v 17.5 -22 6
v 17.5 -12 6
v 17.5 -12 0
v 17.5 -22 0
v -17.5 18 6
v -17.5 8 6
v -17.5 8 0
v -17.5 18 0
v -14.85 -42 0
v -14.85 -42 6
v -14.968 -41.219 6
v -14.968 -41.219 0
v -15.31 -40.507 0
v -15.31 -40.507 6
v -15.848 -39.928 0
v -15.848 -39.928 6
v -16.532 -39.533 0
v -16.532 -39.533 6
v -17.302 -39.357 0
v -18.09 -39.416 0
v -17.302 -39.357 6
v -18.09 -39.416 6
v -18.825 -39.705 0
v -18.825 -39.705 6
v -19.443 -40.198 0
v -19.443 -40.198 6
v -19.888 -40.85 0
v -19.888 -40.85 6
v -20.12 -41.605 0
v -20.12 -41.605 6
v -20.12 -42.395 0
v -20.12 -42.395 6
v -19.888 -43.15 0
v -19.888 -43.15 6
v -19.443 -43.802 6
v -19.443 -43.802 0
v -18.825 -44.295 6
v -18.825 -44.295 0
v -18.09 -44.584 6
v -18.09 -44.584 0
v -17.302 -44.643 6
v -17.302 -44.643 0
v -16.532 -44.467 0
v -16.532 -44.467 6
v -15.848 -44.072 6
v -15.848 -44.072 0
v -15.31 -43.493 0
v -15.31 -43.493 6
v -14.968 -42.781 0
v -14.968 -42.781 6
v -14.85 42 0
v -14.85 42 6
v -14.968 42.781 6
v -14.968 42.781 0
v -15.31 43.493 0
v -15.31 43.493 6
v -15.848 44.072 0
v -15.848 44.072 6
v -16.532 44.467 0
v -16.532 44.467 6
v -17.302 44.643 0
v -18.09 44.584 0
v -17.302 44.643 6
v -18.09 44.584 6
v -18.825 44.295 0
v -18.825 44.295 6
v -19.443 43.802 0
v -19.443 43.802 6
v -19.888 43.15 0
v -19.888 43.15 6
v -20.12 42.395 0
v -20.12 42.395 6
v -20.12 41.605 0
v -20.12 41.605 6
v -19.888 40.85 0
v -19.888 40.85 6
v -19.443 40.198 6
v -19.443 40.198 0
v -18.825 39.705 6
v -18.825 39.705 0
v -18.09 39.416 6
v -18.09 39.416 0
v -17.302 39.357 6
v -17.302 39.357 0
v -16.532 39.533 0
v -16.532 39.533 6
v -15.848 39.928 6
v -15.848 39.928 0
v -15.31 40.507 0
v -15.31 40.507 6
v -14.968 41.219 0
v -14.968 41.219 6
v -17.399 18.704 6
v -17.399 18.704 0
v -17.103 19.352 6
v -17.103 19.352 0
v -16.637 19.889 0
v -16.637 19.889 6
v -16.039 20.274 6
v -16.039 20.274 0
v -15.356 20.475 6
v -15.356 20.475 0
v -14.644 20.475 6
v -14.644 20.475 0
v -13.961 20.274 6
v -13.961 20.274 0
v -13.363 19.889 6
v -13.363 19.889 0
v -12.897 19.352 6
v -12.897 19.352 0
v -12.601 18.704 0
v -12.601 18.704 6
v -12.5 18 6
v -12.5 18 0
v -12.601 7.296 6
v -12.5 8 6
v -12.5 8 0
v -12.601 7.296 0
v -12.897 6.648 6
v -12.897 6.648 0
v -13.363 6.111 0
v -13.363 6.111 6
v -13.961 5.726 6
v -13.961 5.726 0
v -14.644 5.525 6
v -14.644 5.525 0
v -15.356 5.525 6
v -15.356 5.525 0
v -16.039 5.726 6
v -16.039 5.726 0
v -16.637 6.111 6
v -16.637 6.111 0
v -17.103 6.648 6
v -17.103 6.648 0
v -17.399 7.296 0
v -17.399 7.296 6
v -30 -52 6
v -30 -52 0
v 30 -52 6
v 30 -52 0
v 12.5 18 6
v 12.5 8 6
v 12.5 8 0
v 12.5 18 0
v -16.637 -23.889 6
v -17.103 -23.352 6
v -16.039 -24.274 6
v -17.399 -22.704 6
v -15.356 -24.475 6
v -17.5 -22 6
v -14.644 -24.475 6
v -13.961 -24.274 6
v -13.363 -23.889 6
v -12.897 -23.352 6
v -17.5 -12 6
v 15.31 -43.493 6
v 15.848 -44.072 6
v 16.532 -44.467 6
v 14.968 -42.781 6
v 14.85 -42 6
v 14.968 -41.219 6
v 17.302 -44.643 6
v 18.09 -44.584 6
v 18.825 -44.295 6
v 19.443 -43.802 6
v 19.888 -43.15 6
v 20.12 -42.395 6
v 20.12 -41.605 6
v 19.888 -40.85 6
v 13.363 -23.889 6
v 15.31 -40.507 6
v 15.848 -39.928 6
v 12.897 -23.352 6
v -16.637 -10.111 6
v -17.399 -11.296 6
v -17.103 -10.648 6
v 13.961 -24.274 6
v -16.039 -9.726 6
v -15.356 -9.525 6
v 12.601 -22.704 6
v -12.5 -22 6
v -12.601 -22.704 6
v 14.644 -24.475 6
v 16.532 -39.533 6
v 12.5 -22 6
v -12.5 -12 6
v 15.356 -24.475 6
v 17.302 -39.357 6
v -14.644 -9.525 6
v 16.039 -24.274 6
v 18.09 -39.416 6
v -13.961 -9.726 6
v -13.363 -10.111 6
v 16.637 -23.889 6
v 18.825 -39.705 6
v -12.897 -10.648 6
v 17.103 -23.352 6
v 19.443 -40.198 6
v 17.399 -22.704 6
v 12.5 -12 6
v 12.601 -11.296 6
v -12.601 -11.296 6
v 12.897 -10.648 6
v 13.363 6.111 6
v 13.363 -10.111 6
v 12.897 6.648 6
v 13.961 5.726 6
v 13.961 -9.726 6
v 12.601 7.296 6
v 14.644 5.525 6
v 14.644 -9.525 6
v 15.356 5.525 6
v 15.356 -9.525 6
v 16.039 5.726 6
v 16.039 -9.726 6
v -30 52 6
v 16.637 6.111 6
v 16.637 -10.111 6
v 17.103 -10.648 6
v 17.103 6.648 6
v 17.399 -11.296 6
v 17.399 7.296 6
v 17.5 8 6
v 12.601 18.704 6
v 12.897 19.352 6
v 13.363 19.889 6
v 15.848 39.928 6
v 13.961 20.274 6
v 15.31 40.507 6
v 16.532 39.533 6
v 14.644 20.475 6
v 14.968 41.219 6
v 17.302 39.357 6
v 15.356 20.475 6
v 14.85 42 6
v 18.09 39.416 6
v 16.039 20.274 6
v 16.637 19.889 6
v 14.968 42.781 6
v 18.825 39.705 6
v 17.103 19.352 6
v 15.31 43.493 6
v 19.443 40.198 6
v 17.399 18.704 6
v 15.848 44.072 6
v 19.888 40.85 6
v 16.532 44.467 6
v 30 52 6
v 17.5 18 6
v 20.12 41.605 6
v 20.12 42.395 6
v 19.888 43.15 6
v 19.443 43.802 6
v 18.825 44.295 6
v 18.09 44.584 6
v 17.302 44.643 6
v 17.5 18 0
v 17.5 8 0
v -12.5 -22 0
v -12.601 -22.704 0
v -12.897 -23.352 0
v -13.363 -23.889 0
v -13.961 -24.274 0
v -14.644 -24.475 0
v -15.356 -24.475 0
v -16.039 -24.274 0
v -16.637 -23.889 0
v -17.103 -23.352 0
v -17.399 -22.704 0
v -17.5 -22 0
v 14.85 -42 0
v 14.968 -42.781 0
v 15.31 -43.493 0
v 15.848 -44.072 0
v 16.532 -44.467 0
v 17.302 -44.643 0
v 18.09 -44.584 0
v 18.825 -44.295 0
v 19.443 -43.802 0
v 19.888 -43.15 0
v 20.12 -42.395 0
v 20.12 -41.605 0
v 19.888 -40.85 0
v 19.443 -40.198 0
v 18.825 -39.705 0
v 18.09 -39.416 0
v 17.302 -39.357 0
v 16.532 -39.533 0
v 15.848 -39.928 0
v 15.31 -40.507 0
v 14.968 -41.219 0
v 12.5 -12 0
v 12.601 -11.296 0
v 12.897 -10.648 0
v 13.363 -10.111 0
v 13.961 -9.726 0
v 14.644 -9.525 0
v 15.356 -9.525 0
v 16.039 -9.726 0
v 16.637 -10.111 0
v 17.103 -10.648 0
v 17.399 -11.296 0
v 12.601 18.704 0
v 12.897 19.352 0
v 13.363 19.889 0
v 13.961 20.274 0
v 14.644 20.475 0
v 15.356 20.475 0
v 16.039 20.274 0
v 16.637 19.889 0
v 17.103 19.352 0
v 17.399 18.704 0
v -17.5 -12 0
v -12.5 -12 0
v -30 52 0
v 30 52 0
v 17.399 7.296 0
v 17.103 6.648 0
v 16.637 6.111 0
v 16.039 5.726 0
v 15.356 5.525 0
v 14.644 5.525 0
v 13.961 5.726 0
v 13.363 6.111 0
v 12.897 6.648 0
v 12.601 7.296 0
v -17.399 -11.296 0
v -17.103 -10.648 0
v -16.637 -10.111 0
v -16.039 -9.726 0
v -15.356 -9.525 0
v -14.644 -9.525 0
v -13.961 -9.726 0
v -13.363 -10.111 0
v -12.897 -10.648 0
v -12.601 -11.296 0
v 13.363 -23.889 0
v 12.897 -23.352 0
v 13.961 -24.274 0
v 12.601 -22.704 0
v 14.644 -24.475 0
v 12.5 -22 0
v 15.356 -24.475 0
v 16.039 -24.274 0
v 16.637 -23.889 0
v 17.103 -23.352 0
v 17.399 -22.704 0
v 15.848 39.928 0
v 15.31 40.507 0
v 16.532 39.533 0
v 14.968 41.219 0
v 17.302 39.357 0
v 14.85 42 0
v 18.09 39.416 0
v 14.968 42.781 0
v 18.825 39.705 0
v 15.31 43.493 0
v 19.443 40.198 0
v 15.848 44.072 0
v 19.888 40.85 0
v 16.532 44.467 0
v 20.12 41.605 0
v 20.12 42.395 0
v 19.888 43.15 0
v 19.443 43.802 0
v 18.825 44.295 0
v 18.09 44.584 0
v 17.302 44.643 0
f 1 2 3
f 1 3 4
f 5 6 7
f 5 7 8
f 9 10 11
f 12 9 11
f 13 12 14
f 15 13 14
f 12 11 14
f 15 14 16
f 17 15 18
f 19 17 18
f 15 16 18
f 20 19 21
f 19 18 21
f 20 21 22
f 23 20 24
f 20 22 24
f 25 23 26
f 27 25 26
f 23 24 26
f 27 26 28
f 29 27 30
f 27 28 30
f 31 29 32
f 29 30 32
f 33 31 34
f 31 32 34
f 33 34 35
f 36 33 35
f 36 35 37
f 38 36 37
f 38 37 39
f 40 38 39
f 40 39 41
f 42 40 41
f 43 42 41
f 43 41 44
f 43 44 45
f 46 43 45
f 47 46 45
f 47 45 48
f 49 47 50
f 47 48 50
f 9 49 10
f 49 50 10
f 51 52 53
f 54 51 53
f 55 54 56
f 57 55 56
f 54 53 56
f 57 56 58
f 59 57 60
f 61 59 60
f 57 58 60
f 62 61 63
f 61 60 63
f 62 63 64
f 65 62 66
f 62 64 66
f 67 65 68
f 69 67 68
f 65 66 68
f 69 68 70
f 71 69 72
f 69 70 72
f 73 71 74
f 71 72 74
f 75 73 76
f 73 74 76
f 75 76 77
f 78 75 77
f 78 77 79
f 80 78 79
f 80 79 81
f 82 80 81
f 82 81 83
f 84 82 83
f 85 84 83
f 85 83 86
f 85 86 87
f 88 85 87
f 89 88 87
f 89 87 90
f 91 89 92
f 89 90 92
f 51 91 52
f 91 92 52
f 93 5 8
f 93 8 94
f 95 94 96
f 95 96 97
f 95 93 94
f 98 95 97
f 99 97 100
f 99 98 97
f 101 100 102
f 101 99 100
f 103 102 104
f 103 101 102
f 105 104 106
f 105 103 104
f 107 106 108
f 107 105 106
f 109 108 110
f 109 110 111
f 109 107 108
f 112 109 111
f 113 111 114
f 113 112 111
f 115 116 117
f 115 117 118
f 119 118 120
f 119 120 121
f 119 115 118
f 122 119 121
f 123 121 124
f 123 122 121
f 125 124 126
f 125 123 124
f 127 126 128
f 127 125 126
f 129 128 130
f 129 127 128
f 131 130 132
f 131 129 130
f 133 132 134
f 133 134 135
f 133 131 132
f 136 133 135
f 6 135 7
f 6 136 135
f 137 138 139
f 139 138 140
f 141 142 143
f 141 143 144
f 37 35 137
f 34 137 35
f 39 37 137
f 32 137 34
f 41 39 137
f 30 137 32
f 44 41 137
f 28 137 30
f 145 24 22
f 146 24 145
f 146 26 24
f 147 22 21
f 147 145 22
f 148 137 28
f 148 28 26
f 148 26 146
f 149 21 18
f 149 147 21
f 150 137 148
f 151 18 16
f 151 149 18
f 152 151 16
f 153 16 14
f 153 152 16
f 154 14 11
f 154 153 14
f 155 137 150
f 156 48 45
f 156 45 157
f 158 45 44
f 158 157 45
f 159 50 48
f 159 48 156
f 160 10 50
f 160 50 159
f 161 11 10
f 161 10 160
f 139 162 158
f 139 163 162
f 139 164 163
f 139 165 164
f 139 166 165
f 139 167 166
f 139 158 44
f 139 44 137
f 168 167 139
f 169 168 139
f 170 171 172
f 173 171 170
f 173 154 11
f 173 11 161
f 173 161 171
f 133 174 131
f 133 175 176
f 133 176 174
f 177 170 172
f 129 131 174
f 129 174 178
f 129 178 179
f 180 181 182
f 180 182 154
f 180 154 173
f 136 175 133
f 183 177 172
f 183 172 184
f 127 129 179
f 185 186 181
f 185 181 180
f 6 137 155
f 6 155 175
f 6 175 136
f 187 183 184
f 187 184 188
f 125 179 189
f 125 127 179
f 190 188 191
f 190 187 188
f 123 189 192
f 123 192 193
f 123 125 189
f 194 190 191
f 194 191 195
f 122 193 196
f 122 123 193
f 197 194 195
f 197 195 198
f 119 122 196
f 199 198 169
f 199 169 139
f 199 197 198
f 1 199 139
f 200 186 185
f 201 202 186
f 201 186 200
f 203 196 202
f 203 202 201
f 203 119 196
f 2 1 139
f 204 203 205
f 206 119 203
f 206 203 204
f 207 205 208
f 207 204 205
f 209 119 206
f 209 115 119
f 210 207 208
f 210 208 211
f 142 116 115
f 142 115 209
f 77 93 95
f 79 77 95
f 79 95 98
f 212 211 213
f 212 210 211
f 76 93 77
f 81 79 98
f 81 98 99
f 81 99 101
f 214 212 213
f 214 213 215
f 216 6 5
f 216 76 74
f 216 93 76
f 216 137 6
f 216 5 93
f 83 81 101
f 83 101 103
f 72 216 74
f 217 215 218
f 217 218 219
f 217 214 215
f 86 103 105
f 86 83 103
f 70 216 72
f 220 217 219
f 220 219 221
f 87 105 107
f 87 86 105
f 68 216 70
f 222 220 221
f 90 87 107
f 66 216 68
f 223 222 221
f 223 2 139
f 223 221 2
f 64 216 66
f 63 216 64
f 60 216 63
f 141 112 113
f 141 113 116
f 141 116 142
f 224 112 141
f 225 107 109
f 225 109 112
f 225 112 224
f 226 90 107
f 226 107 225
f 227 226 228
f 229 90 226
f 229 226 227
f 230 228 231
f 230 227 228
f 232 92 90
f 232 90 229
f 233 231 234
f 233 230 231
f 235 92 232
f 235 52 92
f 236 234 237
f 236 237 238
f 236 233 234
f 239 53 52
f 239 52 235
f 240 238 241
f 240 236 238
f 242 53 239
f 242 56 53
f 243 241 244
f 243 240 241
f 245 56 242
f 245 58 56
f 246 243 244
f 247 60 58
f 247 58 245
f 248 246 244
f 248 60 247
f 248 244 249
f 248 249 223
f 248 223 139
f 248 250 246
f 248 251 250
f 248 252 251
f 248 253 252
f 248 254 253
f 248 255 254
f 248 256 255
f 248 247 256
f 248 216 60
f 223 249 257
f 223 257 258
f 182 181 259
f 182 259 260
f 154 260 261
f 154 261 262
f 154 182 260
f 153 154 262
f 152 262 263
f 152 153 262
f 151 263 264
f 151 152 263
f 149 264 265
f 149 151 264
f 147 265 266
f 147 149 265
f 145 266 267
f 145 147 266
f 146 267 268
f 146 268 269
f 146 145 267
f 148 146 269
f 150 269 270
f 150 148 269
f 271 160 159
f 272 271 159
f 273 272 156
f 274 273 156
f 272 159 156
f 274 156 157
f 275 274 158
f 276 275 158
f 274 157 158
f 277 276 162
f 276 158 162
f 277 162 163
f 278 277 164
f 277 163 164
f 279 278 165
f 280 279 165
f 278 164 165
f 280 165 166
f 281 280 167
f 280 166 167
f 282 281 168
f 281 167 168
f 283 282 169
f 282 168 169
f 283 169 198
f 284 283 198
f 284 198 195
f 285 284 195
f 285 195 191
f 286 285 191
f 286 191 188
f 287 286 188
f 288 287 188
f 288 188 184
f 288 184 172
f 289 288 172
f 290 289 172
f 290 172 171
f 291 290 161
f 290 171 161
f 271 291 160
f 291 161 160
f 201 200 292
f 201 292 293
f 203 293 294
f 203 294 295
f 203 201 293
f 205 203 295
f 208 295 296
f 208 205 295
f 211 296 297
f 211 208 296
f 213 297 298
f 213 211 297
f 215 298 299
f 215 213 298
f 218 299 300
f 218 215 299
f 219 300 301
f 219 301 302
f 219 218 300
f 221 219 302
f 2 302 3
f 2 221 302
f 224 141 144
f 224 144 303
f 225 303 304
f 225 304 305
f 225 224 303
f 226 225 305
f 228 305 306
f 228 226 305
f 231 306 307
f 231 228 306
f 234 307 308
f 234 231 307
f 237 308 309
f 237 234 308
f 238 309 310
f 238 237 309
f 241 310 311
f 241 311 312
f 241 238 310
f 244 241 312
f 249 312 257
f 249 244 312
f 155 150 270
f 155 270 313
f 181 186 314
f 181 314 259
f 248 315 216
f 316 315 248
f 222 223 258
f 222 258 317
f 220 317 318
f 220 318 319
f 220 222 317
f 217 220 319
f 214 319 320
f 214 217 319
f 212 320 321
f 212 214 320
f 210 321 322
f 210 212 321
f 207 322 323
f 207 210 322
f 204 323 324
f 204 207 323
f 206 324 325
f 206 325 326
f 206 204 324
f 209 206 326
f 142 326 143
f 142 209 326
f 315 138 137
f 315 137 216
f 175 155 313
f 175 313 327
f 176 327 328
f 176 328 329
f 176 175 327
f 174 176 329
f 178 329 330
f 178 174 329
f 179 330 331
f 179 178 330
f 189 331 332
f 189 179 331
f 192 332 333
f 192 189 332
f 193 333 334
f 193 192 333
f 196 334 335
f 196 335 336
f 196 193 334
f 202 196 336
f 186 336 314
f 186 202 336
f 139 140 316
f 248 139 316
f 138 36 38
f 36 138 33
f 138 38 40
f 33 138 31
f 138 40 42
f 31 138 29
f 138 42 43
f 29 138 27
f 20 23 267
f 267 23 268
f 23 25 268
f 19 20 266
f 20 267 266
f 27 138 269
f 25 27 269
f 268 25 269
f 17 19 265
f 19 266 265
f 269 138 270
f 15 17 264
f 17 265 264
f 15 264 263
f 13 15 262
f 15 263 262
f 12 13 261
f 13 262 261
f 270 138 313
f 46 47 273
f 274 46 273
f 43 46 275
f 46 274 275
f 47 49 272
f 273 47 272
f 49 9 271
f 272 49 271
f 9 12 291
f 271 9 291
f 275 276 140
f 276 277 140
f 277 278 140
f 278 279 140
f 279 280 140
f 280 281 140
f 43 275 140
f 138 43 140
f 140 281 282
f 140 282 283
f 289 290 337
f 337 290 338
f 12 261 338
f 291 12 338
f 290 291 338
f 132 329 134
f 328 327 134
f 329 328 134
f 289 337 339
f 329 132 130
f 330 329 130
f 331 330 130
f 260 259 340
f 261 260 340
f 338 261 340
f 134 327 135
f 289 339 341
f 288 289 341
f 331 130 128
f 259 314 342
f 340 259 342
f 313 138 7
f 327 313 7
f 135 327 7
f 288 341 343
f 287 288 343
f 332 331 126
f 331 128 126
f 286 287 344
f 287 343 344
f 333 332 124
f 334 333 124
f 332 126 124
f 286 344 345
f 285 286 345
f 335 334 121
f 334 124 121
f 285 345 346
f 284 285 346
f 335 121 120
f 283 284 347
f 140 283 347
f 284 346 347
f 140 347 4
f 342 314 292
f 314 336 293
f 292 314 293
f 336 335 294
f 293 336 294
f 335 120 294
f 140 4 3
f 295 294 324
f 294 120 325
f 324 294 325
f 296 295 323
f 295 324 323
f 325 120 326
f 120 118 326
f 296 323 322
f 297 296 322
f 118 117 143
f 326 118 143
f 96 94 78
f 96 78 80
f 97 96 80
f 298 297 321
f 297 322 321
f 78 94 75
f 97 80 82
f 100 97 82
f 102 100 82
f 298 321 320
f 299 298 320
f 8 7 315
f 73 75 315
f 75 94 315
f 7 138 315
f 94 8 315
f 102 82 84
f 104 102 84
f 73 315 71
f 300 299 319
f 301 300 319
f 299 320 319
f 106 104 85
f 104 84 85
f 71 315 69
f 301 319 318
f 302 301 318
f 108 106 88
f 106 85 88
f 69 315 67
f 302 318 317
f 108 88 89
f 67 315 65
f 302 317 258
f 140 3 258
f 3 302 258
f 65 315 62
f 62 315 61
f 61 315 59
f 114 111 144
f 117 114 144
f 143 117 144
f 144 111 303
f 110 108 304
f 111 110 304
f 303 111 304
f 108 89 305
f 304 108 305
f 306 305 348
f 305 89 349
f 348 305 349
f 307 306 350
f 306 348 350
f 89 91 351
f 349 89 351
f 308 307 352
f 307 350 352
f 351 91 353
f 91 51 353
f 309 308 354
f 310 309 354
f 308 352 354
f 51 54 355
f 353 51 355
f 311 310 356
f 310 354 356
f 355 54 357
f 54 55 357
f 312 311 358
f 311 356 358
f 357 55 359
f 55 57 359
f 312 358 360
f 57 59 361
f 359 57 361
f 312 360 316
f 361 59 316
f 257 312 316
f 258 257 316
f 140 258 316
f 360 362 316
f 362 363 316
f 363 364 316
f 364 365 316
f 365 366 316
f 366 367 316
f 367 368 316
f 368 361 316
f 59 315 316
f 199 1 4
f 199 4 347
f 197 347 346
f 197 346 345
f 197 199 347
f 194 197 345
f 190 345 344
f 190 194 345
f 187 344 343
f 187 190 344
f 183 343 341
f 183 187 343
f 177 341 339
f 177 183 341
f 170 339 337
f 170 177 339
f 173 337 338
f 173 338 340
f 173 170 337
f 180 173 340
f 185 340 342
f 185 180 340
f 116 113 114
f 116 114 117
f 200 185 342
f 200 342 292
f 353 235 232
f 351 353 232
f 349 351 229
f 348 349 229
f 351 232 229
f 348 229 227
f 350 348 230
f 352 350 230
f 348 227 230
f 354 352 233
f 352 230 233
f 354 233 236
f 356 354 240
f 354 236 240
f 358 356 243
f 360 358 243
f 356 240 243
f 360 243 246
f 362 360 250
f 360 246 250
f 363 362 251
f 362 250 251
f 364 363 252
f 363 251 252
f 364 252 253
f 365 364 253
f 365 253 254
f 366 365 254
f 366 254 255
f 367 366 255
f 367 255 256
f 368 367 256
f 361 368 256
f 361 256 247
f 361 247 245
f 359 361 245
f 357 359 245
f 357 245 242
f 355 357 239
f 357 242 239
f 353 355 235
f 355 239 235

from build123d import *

# Parameters (mm, degrees)
SKETCH_1_W          = 60
SKETCH_1_H          = 104
EXTRUDE_1_DEPTH     = 6
CUT_EXTRUDE_1_DEPTH = 6
SKETCH_4_R          = 2.65
CUT_EXTRUDE_2_DEPTH = 6


with BuildPart() as part:
    # 草图1 → 凸台-拉伸1 (new body)
    with BuildSketch(Plane.XY):
        Rectangle(SKETCH_1_W, SKETCH_1_H)
    extrude(amount=EXTRUDE_1_DEPTH)

    # 草图2 → 切除-拉伸1 (cut)
    with BuildSketch(Plane.XY.offset(6)):
        with BuildLine():
            Line((-12.5, 18), (-12.5, 8))
            ThreePointArc((-12.5, 8), (-15, 5.5), (-17.5, 8))
            Line((-17.5, 8), (-17.5, 18))
            ThreePointArc((-17.5, 18), (-15, 20.5), (-12.5, 18))
        make_face()
        with BuildLine():
            Line((17.5, 18), (17.5, 8))
            ThreePointArc((17.5, 8), (15, 5.5), (12.5, 8))
            Line((12.5, 8), (12.5, 18))
            ThreePointArc((12.5, 18), (15, 20.5), (17.5, 18))
        make_face()
        with BuildLine():
            Line((17.5, -12), (17.5, -22))
            ThreePointArc((17.5, -22), (15, -24.5), (12.5, -22))
            Line((12.5, -22), (12.5, -12))
            ThreePointArc((12.5, -12), (15, -9.5), (17.5, -12))
        make_face()
        with BuildLine():
            Line((-12.5, -12), (-12.5, -22))
            ThreePointArc((-12.5, -22), (-15, -24.5), (-17.5, -22))
            Line((-17.5, -22), (-17.5, -12))
            ThreePointArc((-17.5, -12), (-15, -9.5), (-12.5, -12))
        make_face()
    extrude(amount=-CUT_EXTRUDE_1_DEPTH, mode=Mode.SUBTRACT)

    # 草图4 → 切除-拉伸2 (cut)
    with BuildSketch(Plane.XY.offset(6)):
        with Locations((-17.5, 42)):
            Circle(SKETCH_4_R)
        with Locations((-17.5, -42)):
            Circle(SKETCH_4_R)
        with Locations(Location((17.5, -42, 0), (0, 0, 180))):
            Circle(SKETCH_4_R)
        with Locations(Location((17.5, 42, 0), (0, 0, 180))):
            Circle(SKETCH_4_R)
    extrude(amount=-CUT_EXTRUDE_2_DEPTH, mode=Mode.SUBTRACT)


solid = part.part
